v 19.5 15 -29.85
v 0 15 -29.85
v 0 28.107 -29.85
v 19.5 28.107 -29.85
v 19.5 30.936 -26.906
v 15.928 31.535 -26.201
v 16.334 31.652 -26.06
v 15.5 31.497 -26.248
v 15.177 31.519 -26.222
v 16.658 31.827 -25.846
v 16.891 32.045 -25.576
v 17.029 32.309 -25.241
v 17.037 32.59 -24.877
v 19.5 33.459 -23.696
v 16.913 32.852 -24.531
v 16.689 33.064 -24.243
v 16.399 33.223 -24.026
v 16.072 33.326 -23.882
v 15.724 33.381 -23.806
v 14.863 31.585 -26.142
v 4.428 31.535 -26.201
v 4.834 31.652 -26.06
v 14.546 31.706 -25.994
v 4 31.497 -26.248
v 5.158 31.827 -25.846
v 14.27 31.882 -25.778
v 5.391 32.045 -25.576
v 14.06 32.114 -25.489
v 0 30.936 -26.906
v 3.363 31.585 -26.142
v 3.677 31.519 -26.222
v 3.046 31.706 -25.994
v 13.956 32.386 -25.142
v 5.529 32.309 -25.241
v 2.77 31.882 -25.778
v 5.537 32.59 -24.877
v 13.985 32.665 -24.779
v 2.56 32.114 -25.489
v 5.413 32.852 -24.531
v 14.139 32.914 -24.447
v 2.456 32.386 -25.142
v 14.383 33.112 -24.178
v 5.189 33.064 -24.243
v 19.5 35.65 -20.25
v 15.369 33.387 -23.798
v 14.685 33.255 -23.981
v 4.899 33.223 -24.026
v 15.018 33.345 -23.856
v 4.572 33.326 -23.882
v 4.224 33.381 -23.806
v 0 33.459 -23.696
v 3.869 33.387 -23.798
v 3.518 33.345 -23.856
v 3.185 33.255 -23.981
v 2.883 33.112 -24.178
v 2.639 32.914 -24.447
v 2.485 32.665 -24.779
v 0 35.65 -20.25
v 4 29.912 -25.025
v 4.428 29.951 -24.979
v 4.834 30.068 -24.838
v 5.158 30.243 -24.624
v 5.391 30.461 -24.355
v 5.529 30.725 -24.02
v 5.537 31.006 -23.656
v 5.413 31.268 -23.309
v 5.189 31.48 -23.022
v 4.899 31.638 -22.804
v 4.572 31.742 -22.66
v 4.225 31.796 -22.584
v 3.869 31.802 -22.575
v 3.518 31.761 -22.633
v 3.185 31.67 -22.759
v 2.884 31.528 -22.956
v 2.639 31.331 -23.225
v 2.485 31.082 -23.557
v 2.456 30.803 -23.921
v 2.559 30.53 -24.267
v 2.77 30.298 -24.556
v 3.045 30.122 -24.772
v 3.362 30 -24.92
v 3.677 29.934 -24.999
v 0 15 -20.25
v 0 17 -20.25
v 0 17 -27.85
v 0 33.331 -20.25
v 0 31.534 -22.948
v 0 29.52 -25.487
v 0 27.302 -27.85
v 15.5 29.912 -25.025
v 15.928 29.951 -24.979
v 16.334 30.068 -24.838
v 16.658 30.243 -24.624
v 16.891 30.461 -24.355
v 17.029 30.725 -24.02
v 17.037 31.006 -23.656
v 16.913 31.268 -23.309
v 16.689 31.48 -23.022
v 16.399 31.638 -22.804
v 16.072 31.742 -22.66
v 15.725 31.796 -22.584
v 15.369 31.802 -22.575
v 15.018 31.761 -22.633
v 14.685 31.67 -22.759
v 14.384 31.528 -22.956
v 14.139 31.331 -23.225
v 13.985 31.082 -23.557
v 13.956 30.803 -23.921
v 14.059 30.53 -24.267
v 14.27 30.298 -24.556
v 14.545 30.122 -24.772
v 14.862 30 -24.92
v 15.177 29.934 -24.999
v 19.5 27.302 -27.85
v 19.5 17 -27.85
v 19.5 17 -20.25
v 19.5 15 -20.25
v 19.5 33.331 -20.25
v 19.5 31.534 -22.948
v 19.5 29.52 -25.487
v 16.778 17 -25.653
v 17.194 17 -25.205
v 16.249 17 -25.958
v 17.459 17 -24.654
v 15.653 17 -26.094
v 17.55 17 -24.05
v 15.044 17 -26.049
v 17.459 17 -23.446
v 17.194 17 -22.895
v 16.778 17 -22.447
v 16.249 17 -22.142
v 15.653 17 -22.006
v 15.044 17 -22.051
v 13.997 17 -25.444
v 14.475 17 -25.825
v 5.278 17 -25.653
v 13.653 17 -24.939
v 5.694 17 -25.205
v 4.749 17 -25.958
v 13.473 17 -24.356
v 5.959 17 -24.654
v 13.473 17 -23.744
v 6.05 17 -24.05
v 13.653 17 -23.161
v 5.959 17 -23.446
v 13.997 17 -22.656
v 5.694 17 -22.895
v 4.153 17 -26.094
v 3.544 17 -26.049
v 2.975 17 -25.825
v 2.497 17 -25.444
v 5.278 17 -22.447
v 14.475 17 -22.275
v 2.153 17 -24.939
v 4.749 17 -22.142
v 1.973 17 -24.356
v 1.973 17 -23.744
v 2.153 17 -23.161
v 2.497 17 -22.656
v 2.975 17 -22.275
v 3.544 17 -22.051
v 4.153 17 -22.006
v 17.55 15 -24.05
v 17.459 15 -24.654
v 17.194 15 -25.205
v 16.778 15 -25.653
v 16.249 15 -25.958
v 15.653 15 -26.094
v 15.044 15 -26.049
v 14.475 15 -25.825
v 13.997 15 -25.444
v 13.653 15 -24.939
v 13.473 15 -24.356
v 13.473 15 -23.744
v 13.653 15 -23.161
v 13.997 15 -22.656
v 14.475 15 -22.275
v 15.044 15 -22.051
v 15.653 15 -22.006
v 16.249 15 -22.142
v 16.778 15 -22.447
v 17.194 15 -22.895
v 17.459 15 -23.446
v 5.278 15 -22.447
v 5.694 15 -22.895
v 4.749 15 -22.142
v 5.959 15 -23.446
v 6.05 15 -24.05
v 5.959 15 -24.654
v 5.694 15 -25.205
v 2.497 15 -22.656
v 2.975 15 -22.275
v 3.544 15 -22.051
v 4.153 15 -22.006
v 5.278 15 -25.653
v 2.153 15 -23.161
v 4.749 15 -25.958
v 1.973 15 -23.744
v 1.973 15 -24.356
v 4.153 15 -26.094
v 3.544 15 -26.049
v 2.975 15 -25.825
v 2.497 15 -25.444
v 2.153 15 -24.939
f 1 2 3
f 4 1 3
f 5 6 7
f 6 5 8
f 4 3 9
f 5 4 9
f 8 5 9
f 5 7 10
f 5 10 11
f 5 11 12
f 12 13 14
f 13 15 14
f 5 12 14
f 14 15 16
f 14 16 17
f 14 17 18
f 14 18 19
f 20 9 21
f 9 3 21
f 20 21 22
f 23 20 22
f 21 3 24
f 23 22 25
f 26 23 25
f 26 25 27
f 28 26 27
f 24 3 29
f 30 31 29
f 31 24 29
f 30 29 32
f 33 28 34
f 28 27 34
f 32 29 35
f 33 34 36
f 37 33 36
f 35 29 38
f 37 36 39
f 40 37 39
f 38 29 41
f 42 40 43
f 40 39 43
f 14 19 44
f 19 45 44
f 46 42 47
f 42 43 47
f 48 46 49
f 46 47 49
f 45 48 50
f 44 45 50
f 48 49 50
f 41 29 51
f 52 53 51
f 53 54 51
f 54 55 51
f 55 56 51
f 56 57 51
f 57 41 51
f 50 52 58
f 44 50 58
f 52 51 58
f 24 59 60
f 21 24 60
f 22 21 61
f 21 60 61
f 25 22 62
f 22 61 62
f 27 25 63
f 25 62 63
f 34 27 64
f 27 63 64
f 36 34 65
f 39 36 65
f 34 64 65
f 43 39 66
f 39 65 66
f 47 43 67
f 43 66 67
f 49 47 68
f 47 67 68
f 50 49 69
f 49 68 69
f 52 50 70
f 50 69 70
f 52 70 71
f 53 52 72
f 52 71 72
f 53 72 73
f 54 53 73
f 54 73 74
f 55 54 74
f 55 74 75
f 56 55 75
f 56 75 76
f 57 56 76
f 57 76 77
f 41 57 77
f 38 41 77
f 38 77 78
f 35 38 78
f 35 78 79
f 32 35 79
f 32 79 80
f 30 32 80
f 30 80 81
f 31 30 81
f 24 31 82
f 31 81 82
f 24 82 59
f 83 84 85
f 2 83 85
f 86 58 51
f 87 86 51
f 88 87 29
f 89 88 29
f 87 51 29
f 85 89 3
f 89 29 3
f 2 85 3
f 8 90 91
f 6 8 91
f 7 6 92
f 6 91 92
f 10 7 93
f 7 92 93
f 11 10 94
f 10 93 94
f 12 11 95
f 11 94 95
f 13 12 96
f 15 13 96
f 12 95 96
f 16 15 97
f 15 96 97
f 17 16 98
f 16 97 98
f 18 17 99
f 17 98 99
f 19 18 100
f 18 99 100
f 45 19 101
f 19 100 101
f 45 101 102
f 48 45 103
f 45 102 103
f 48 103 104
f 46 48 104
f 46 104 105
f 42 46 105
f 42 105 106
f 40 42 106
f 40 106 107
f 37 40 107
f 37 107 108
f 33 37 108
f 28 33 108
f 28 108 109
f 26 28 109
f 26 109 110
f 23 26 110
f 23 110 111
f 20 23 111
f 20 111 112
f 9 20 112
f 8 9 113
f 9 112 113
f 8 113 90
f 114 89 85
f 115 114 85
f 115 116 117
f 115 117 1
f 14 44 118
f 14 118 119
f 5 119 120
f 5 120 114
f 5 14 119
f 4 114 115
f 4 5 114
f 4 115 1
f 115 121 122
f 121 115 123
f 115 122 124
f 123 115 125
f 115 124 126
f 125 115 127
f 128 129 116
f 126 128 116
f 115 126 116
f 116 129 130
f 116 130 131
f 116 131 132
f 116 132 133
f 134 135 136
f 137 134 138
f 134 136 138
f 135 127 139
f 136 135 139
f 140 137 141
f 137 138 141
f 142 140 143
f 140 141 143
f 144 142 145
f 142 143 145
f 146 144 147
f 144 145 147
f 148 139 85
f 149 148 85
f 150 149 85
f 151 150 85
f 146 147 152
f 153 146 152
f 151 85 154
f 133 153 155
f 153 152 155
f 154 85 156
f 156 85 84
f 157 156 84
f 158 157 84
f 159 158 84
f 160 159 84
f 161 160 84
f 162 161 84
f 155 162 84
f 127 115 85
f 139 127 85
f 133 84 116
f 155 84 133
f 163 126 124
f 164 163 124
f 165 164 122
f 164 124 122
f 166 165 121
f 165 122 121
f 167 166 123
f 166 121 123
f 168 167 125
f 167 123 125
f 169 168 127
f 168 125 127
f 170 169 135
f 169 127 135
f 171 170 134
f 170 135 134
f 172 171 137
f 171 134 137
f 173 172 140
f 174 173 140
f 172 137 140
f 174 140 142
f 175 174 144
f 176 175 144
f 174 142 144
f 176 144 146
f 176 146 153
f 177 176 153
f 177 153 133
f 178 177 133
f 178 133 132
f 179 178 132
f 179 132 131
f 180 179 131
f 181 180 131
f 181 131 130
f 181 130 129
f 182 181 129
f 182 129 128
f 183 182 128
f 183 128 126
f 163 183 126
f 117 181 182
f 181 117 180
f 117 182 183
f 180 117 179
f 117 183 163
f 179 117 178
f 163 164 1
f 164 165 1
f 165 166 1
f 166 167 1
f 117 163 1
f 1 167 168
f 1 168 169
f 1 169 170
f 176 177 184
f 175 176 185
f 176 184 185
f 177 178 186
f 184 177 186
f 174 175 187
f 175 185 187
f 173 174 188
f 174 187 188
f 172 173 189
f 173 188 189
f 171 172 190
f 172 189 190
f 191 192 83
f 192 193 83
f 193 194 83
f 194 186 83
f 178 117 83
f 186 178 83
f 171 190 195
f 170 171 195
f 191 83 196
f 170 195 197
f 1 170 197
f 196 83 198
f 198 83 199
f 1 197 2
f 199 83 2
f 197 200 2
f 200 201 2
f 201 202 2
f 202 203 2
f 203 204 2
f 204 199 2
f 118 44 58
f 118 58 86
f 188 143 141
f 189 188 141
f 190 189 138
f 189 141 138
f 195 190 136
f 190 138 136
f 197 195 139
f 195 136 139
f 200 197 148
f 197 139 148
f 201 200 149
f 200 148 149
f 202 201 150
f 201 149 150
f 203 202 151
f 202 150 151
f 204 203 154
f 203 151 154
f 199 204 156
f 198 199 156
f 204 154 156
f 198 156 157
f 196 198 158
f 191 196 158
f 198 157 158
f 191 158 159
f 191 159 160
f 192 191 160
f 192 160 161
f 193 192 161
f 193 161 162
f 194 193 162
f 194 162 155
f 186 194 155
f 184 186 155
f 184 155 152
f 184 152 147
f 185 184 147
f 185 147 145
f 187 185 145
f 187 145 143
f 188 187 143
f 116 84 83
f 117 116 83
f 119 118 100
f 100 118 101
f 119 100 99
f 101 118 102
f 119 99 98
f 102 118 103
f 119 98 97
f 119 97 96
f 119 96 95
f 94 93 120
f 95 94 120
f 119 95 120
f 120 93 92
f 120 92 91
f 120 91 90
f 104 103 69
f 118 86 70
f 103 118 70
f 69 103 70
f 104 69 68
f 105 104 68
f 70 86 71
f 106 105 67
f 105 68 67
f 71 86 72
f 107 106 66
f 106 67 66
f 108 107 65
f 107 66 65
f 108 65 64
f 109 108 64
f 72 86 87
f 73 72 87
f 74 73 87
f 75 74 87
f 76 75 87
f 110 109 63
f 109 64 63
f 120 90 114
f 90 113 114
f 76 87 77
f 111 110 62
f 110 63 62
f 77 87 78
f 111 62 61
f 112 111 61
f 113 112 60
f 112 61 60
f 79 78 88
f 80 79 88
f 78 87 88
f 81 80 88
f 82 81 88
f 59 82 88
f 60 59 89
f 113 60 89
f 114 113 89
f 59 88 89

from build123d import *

# Parameters (mm, degrees)
BOSS_EXTRU_1_DEPTH           = 19.5
D_GAGEMENT_M3_51_D           = 4.1
D_GAGEMENT_M3_51_DEPTH       = 2
D_GAGEMENT_M2_51_D           = 3.1
D_GAGEMENT_M2_51_ON_FACE_2_D = 3.1


with BuildPart() as part:
    # Esquisse1 → Boss.-Extru.1 (new body)
    with BuildSketch(Plane(origin=(0, 0, 0), x_dir=(0, 0, -1), z_dir=(1, 0, 0))):
        with BuildLine():
            Line((29.85, 15), (29.85, 28.106538385))
            ThreePointArc((29.85, 28.106538385), (25.332375467, 32.237722519), (20.25, 35.650210378))
            Line((20.25, 35.650210378), (20.25, 33.330729065))
            ThreePointArc((20.25, 33.330729065), (24.238194894, 30.553394382), (27.85, 27.301602517))
            Line((27.85, 27.301602517), (27.85, 17))
            Line((27.85, 17), (20.25, 17))
            Line((20.25, 17), (20.25, 15))
            Line((20.25, 15), (29.85, 15))
        make_face()
    extrude(amount=BOSS_EXTRU_1_DEPTH)

    # Dégagement M3.51
    with Locations(Plane(origin=(0, 15, 0), x_dir=(-1, 0, 0), z_dir=(0, -1, 0))):
        with Locations((-15.5, 24.05), (-4, 24.05)):
            Hole(D_GAGEMENT_M3_51_D / 2, depth=D_GAGEMENT_M3_51_DEPTH)

    # Dégagement M2.51 (through all)
    with Locations(Plane(origin=(4, 32.466671627, -25.03827537), x_dir=(0, 0.610689643, 0.79187004), z_dir=(0, 0.79187004, -0.610689643))):
        with Locations((0, 0)):
            Hole(D_GAGEMENT_M2_51_D / 2)

    # Dégagement M2.51 on face 2 (through all)
    with Locations(Plane(origin=(15.5, 32.466671627, -25.03827537), x_dir=(0, 0.610689886, 0.791869852), z_dir=(0, 0.791869852, -0.610689886))):
        with Locations((0, 0)):
            Hole(D_GAGEMENT_M2_51_ON_FACE_2_D / 2)


solid = part.part
